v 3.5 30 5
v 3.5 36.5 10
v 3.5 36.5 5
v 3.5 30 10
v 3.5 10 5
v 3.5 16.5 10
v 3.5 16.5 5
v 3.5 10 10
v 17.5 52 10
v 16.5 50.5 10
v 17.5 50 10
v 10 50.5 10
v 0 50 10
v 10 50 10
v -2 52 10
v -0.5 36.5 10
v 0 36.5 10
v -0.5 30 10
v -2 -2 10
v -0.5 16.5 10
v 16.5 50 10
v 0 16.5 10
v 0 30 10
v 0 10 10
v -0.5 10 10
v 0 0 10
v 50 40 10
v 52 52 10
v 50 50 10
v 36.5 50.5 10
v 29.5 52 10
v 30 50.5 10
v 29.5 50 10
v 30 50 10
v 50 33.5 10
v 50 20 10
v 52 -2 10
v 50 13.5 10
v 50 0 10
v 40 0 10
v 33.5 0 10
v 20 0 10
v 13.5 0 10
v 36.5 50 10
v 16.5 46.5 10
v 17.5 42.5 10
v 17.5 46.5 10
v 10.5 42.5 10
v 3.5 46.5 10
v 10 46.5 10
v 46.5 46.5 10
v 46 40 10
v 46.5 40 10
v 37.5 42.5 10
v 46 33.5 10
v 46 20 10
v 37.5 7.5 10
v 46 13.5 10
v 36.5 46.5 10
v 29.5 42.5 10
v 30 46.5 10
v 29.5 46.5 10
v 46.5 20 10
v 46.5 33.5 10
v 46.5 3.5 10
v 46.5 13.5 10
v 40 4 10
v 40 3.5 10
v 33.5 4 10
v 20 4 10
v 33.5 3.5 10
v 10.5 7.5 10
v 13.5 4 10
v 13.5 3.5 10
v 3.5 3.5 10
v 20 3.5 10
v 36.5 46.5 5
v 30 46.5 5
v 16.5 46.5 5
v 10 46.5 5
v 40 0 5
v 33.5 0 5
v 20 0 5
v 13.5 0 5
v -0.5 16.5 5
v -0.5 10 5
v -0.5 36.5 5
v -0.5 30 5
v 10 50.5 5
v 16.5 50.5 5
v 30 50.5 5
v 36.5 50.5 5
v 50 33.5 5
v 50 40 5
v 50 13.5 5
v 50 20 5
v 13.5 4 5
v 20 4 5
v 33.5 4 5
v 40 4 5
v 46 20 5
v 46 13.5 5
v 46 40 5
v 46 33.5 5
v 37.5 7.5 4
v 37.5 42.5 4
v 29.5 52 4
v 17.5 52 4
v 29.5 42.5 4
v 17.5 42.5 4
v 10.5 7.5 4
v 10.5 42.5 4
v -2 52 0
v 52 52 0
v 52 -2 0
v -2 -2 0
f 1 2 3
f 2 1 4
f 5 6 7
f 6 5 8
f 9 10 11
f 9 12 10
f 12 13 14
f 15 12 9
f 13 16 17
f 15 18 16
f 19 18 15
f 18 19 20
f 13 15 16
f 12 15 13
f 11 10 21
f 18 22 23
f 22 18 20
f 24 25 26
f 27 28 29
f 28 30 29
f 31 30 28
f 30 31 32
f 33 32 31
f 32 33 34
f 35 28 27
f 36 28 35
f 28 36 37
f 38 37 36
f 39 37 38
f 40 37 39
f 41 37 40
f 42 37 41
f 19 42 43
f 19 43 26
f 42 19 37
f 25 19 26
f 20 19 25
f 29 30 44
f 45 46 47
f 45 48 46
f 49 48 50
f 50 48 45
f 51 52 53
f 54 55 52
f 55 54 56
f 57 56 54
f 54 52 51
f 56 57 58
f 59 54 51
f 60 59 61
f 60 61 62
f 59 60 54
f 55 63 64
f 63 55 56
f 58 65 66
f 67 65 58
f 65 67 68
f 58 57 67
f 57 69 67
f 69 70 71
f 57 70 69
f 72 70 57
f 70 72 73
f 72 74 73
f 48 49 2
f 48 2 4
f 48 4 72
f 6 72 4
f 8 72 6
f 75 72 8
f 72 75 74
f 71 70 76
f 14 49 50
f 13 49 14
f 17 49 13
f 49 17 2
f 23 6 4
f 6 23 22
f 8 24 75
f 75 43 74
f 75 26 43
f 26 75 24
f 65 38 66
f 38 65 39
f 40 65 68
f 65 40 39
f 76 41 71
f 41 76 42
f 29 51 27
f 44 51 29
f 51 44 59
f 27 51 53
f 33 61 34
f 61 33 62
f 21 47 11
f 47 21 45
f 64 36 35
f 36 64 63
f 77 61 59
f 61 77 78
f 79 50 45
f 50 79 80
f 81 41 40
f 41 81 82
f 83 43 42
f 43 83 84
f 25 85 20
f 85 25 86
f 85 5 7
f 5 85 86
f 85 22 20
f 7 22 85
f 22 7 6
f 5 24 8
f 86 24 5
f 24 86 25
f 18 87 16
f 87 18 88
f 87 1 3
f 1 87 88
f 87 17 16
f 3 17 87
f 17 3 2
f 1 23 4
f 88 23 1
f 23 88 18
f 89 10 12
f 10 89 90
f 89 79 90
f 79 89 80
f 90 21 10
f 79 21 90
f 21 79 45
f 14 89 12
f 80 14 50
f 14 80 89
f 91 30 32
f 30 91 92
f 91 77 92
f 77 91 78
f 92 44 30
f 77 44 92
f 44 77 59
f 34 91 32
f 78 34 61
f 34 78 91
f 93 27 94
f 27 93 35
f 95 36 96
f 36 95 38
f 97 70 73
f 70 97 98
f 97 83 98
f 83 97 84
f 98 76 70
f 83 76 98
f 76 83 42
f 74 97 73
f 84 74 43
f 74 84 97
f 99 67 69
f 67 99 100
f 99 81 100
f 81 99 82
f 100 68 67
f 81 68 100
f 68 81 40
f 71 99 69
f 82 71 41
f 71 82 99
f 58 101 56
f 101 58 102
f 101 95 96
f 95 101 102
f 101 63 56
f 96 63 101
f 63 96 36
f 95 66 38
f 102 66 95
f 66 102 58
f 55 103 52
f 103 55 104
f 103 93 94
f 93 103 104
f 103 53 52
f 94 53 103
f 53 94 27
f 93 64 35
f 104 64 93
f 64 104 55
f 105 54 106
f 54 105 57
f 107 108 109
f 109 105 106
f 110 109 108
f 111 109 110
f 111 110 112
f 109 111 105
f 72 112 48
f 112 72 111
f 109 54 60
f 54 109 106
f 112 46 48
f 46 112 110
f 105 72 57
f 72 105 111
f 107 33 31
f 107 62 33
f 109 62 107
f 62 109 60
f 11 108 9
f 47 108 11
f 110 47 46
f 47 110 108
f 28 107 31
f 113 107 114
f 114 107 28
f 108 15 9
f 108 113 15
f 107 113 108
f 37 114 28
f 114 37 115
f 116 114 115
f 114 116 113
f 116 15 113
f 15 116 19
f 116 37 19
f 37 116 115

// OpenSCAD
HEIGHT_BASE = 10;
EDGE = 50;
margin = 4;

module arduino()
{
    translate([(EDGE-27)/2-1    ,(EDGE-35)/2, 4])
    cube([27, 35, 10]);
    
    translate([(EDGE-15)/2,(EDGE-10)/2+20, 4])
    cube([12, 12, 10]);
}
module base()
{
    translate([-margin/2, -margin/2, 0])
    cube([EDGE+margin, EDGE+margin, HEIGHT_BASE]);
}



module plexi(depth)
{
    ma = 0.5;
    // Retirer depth au total pour permettre de mettre une autre pièce après
    cube([40, EDGE-depth, depth]);
    
    translate([-5,10,0])
    cube([5, 2*3+ma, depth+ma]);
    
    translate([-5,30,0])
    cube([5, 2*3+ma, depth+ma]);
}


module plexi_vias(plexi_depth)
{
    rotate([0, -90,0]){
    translate([HEIGHT_BASE, 0, -plexi_depth])
    plexi(plexi_depth);
     
    
    translate([HEIGHT_BASE, EDGE-plexi_depth,0])
    rotate([-90, 0,0])
    plexi(plexi_depth);
  
    translate([HEIGHT_BASE, 0,-plexi_depth])
    rotate([-90, 0,0])
    plexi(plexi_depth);
    
    translate([HEIGHT_BASE,plexi_depth,-EDGE])
    plexi(plexi_depth);
    }
    
}

difference(){
base();
plexi_vias(3.5);
arduino();
}

//plexi(3);
//
//color([10, 0, 20])

//projection(cut=true){
//cube([50, 50, 3]);
//}

//projection(cut=true){
//plexi(3);
//}
